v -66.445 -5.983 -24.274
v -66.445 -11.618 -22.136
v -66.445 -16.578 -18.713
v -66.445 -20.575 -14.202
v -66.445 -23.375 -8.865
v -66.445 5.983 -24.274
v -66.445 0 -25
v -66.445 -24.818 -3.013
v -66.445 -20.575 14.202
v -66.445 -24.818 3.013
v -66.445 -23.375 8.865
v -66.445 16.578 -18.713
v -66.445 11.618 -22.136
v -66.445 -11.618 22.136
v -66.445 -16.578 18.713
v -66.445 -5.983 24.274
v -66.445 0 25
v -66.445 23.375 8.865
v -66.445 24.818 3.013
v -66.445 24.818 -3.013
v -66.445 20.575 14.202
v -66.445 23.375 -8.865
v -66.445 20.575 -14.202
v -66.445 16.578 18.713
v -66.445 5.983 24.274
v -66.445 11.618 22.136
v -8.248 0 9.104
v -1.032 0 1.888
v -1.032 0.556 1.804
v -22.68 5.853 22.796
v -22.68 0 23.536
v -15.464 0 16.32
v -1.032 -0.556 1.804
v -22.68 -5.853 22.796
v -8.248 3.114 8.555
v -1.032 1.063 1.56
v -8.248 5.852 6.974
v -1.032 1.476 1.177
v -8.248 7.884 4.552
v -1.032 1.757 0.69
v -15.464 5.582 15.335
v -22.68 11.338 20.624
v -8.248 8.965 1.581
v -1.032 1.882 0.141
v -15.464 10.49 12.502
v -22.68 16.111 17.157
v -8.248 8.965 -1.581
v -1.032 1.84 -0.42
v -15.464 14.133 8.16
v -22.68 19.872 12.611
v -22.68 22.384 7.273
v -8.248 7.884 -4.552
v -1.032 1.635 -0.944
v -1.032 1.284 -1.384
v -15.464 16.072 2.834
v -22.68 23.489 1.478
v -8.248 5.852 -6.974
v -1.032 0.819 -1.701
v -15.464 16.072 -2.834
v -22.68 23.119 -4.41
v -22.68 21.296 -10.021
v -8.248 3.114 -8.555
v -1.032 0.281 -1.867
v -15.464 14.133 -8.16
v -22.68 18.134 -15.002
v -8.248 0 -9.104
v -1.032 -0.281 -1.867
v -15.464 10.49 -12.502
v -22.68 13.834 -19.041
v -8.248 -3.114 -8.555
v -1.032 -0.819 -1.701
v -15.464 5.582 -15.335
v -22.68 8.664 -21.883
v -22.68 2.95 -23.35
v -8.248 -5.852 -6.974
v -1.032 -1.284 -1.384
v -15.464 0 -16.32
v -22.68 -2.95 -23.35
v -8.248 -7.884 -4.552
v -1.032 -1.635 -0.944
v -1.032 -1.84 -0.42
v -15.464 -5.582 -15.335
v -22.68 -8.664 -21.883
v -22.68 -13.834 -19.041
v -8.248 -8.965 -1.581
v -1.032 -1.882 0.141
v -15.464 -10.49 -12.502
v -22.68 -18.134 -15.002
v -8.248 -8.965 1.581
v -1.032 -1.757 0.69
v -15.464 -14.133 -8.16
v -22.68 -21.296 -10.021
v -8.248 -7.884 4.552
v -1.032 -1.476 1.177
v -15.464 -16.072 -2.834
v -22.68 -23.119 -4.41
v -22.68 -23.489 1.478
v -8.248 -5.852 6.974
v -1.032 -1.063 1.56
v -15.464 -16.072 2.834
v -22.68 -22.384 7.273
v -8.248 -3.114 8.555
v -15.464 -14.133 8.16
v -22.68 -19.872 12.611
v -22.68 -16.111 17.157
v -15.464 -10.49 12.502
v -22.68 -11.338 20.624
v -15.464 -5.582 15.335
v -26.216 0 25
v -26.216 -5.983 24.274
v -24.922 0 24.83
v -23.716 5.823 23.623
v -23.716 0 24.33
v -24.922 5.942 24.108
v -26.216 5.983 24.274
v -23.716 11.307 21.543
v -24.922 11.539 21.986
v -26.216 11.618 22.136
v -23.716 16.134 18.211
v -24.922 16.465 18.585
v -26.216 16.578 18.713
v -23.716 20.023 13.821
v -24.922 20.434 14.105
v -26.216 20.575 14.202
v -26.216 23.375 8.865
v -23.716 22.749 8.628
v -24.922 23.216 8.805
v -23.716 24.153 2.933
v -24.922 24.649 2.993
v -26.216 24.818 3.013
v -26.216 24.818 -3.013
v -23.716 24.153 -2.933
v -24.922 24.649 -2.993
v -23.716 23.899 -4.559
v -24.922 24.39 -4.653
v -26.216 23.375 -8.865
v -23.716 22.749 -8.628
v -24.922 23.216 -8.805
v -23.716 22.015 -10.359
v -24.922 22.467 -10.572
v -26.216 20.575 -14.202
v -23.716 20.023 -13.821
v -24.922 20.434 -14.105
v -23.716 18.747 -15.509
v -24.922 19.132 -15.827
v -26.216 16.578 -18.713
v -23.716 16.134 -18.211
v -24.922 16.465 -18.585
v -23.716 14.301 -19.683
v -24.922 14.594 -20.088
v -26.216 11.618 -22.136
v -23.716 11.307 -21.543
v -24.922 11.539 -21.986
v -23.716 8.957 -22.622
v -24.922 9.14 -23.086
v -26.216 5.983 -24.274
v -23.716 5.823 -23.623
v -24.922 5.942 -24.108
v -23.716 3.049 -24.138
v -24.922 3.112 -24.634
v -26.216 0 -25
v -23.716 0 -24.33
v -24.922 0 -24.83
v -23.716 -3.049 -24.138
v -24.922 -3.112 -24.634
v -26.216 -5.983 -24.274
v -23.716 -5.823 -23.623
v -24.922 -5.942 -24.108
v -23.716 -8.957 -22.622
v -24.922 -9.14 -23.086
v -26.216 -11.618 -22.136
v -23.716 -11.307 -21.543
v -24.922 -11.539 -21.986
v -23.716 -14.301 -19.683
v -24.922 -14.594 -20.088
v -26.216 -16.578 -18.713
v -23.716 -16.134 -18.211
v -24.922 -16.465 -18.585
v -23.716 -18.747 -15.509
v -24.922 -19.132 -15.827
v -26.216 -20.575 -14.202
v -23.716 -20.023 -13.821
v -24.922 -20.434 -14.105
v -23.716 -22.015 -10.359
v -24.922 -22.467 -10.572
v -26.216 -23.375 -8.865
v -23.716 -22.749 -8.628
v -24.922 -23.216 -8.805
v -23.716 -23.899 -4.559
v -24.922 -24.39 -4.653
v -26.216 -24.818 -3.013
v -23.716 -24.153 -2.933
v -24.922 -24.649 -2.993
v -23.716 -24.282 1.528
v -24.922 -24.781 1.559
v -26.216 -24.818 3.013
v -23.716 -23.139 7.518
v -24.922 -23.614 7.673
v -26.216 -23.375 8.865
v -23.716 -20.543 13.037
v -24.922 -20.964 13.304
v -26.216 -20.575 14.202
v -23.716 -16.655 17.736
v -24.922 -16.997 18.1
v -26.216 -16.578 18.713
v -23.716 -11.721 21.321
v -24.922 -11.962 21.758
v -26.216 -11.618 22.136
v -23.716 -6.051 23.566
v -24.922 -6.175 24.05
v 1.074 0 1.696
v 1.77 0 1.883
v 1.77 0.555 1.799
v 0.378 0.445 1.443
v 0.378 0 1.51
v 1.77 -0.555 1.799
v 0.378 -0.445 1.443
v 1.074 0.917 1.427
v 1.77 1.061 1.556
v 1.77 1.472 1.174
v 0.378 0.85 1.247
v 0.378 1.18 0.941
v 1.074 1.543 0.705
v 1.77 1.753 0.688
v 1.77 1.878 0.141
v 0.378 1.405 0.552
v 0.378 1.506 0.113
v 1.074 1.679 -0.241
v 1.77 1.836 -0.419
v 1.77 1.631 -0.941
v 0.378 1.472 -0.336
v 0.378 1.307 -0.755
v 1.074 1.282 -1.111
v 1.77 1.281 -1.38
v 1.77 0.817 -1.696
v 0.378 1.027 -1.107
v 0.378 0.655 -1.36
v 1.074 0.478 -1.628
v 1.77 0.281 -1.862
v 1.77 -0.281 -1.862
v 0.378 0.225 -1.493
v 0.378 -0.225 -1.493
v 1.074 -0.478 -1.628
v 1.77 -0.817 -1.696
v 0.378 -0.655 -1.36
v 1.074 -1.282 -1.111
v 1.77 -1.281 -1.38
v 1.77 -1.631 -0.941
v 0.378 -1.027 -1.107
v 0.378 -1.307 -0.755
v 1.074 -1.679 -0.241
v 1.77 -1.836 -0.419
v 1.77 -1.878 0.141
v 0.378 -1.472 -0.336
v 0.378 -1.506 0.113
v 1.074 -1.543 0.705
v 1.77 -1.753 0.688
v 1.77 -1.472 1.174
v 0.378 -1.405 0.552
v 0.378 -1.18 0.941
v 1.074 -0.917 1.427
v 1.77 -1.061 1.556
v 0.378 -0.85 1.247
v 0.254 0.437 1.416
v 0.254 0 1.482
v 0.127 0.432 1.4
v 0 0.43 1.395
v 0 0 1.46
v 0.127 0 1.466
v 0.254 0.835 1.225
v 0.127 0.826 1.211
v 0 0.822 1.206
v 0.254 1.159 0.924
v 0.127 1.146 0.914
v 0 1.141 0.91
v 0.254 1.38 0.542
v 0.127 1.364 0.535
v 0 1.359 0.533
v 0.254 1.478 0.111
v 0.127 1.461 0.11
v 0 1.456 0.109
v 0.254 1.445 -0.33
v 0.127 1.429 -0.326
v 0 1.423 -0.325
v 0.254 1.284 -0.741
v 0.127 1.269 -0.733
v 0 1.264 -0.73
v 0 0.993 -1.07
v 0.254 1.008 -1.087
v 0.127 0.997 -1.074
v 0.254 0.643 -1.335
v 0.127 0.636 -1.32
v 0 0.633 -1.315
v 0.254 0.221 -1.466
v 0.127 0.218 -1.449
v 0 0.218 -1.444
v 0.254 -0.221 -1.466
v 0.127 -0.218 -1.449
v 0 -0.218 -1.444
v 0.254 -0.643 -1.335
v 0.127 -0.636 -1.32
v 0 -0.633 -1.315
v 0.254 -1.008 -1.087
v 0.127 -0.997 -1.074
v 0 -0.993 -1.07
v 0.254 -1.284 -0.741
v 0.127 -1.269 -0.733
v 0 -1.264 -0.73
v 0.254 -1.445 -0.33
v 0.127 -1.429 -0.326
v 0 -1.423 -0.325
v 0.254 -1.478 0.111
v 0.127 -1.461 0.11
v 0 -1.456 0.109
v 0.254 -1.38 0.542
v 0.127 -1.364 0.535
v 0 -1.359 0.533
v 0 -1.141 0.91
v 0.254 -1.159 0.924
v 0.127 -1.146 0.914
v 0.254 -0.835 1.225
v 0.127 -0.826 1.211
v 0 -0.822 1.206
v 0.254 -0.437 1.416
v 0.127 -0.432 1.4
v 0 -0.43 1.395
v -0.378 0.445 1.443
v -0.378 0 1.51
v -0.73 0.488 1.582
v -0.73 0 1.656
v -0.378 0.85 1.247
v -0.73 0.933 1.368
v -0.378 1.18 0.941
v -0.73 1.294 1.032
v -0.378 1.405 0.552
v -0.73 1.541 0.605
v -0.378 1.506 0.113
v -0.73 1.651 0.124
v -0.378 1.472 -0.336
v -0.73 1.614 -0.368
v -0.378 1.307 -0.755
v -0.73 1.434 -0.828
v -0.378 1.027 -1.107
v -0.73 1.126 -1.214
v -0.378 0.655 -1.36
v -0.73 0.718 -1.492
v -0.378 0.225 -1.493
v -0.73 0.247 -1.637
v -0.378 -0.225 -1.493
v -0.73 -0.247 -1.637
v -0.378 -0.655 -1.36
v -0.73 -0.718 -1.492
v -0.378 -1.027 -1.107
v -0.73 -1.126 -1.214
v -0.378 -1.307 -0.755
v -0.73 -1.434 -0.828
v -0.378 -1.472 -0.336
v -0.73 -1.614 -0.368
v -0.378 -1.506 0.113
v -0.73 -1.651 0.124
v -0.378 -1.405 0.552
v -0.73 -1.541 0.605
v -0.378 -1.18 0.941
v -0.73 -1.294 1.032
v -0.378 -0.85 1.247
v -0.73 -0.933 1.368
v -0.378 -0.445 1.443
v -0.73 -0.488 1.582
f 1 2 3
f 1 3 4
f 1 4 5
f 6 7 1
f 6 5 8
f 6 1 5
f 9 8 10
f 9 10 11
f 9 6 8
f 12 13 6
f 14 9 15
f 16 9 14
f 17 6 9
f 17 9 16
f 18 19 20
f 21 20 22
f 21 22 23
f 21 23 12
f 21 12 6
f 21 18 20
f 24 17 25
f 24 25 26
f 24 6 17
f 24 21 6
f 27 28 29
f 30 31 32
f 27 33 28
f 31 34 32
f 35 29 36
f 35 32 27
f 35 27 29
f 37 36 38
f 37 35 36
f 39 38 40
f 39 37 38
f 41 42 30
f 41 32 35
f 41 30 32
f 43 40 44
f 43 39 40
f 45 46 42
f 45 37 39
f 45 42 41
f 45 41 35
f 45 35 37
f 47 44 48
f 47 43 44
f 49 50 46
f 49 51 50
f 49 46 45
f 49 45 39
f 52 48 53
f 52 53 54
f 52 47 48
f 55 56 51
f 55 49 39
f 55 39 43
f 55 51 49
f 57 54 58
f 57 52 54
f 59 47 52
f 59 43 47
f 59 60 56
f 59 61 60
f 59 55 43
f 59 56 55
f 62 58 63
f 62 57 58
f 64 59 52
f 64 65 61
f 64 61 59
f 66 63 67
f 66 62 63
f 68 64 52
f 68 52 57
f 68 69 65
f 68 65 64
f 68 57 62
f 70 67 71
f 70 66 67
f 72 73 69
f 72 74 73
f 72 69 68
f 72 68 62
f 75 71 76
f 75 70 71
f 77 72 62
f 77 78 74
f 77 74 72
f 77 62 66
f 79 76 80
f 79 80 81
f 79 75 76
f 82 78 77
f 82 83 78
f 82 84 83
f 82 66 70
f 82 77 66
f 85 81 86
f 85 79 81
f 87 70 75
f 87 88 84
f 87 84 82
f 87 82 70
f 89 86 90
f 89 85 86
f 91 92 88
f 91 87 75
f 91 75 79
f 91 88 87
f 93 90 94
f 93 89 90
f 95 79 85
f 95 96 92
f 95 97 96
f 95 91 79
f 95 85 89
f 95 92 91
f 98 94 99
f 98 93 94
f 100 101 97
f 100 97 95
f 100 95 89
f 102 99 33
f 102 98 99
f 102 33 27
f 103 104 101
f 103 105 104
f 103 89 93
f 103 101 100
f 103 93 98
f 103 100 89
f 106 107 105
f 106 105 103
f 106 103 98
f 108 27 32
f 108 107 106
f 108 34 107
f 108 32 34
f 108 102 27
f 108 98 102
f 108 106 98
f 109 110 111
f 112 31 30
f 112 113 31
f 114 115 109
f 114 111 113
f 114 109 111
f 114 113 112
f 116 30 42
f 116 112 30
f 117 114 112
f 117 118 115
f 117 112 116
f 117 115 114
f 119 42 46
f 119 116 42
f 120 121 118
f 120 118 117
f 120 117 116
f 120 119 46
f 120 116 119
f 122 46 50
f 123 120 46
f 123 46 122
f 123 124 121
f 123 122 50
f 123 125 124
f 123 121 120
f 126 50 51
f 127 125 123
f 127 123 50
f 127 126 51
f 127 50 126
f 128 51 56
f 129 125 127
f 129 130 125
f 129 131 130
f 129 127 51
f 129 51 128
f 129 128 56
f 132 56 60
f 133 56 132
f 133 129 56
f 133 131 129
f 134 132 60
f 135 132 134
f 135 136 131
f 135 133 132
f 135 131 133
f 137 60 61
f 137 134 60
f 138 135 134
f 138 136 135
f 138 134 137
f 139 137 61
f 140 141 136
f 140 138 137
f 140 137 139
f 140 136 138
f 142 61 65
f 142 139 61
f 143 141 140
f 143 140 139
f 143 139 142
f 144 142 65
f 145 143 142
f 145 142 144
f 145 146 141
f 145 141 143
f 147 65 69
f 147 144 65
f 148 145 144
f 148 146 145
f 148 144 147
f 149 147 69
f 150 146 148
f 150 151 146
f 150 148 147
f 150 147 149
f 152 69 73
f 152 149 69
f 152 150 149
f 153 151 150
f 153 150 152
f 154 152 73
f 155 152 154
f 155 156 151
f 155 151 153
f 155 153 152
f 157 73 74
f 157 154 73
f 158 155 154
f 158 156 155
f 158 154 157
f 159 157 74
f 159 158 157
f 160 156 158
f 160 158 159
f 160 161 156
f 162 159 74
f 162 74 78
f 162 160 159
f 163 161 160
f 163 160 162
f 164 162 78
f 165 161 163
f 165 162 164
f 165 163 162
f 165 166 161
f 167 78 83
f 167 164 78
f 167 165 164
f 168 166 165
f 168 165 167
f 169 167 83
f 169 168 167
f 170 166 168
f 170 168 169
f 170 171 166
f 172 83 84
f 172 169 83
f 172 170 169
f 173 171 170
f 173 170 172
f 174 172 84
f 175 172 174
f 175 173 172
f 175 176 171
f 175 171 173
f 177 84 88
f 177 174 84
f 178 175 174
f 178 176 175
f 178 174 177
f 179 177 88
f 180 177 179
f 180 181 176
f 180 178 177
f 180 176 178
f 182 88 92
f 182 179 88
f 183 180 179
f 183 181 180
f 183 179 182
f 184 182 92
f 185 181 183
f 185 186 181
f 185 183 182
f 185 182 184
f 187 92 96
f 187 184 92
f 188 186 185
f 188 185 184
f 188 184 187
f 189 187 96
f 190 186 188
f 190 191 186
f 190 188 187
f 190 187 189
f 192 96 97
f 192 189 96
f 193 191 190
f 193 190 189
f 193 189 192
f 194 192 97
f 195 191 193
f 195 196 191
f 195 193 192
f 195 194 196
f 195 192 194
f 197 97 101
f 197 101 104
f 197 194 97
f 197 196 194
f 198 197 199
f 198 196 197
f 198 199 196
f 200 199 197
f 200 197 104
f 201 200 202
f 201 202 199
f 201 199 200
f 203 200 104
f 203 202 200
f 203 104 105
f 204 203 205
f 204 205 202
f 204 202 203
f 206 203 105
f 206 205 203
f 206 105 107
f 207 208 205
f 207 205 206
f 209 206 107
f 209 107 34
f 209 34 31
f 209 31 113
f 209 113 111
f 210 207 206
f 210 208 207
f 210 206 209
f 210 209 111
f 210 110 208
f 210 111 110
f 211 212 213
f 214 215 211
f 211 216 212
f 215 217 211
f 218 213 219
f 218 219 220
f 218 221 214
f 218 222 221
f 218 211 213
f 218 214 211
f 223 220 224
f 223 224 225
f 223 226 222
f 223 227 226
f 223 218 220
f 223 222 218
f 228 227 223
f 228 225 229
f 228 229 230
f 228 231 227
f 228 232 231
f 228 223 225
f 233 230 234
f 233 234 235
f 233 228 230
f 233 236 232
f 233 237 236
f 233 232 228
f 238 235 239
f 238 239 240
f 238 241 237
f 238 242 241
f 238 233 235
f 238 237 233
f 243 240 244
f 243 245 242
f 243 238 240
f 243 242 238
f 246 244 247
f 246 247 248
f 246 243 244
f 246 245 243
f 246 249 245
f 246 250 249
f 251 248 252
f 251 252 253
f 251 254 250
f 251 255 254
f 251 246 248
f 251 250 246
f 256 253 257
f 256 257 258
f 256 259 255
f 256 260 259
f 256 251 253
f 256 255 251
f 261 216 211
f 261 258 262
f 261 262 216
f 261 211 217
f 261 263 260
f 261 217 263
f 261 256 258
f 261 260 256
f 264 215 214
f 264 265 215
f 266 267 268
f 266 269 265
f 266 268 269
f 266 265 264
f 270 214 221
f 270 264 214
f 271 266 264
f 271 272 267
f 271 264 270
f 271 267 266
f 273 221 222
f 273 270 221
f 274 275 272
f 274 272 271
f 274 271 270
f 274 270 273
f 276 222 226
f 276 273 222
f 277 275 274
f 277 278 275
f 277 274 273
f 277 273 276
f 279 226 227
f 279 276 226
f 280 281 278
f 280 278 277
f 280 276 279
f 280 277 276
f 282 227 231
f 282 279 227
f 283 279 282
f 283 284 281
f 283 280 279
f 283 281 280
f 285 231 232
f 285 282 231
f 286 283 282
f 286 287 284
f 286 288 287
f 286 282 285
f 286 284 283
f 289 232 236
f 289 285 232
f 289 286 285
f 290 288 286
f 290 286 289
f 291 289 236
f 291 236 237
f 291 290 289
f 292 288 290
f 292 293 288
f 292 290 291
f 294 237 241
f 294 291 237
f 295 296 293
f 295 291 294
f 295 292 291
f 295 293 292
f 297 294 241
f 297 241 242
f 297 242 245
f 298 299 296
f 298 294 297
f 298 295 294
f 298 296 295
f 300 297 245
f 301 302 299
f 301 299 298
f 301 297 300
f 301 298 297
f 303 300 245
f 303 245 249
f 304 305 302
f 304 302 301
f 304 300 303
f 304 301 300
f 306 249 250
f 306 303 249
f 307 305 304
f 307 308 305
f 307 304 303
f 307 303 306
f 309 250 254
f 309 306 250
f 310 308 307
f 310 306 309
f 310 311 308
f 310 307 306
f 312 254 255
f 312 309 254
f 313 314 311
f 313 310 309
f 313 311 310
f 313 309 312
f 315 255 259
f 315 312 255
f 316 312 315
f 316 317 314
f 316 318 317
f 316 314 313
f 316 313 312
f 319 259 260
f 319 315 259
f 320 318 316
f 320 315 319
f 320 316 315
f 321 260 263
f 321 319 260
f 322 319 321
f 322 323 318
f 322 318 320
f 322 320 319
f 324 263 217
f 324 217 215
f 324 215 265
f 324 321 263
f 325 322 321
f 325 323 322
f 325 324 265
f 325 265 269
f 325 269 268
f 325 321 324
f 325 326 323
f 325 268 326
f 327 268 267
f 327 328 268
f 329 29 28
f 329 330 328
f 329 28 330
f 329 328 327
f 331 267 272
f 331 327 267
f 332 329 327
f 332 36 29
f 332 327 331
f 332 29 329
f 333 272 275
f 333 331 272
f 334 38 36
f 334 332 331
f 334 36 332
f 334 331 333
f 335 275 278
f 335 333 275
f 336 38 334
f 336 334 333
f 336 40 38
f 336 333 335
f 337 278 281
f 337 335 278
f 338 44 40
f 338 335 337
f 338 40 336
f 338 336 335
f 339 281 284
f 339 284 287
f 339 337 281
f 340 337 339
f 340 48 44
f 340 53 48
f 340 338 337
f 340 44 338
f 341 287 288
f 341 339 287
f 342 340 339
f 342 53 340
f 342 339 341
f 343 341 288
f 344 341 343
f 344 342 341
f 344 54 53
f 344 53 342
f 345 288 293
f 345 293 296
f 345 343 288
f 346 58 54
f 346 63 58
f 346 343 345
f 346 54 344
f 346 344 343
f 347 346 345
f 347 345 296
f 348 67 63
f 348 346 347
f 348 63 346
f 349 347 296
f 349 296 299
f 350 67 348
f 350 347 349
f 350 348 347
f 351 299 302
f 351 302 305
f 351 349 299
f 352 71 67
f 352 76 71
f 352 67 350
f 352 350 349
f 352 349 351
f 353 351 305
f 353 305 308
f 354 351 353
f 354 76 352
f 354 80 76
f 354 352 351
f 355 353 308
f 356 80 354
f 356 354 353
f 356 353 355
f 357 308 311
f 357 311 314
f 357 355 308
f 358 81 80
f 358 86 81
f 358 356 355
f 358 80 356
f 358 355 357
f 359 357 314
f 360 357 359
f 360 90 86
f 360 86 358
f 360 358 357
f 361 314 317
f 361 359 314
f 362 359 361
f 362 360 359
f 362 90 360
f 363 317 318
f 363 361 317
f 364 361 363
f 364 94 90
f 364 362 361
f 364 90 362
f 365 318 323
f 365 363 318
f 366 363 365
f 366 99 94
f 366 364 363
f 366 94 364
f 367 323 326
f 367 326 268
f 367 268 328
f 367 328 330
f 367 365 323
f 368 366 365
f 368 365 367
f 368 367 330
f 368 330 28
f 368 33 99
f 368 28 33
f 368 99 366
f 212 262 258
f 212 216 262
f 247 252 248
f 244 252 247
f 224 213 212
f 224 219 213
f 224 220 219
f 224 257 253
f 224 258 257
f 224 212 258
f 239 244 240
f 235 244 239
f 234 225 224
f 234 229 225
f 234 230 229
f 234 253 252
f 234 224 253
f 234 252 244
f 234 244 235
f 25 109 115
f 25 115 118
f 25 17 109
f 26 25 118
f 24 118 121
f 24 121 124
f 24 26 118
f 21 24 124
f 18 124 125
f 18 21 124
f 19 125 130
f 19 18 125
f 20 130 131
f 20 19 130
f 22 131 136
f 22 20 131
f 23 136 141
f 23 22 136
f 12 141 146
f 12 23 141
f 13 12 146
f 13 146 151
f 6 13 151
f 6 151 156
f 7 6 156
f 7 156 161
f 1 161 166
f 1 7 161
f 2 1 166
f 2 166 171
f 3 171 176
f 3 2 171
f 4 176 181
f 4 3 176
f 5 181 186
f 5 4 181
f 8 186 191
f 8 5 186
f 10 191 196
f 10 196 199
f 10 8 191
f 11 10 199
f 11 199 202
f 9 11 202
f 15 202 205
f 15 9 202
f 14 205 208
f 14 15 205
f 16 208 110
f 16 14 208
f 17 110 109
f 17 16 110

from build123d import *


# Not quite as in the source:
# - a feature of the source that left no trace in its solid (it failed there, or was rolled back) is left out


with BuildPart() as f2:
    # F0 (on Front) → F2 (revolve)
    with BuildSketch(Plane.XZ):
        with BuildLine():
            ThreePointArc((0.3778758058, 1.5097482936), (0.1905682406, 1.4724905024), (0, 1.46))
            ThreePointArc((0, 1.46), (-0.5587178113, 1.5711358825), (-1.0323759005, 1.8876240995))
            Line((-1.0323759005, 1.8876240995), (-22.680285707, 23.5355339059))
            ThreePointArc((-22.680285707, 23.5355339059), (-24.3024024511, 24.6193976626), (-26.2158196129, 25))
            Line((-26.2158196129, 25), (-66.445, 25))
            Line((-66.445, 25), (-66.445, 0))
            Line((-66.445, 0), (0, 0))
            Line((0, 0), (1.77, 0))
            Line((1.77, 0), (1.77, 1.8827668472))
            Line((1.77, 1.8827668472), (0.3778758058, 1.5097482936))
        make_face()
    revolve(axis=Axis((-33.2225, 0, 0), (-1, 0, 0)))


solid = f2.part
